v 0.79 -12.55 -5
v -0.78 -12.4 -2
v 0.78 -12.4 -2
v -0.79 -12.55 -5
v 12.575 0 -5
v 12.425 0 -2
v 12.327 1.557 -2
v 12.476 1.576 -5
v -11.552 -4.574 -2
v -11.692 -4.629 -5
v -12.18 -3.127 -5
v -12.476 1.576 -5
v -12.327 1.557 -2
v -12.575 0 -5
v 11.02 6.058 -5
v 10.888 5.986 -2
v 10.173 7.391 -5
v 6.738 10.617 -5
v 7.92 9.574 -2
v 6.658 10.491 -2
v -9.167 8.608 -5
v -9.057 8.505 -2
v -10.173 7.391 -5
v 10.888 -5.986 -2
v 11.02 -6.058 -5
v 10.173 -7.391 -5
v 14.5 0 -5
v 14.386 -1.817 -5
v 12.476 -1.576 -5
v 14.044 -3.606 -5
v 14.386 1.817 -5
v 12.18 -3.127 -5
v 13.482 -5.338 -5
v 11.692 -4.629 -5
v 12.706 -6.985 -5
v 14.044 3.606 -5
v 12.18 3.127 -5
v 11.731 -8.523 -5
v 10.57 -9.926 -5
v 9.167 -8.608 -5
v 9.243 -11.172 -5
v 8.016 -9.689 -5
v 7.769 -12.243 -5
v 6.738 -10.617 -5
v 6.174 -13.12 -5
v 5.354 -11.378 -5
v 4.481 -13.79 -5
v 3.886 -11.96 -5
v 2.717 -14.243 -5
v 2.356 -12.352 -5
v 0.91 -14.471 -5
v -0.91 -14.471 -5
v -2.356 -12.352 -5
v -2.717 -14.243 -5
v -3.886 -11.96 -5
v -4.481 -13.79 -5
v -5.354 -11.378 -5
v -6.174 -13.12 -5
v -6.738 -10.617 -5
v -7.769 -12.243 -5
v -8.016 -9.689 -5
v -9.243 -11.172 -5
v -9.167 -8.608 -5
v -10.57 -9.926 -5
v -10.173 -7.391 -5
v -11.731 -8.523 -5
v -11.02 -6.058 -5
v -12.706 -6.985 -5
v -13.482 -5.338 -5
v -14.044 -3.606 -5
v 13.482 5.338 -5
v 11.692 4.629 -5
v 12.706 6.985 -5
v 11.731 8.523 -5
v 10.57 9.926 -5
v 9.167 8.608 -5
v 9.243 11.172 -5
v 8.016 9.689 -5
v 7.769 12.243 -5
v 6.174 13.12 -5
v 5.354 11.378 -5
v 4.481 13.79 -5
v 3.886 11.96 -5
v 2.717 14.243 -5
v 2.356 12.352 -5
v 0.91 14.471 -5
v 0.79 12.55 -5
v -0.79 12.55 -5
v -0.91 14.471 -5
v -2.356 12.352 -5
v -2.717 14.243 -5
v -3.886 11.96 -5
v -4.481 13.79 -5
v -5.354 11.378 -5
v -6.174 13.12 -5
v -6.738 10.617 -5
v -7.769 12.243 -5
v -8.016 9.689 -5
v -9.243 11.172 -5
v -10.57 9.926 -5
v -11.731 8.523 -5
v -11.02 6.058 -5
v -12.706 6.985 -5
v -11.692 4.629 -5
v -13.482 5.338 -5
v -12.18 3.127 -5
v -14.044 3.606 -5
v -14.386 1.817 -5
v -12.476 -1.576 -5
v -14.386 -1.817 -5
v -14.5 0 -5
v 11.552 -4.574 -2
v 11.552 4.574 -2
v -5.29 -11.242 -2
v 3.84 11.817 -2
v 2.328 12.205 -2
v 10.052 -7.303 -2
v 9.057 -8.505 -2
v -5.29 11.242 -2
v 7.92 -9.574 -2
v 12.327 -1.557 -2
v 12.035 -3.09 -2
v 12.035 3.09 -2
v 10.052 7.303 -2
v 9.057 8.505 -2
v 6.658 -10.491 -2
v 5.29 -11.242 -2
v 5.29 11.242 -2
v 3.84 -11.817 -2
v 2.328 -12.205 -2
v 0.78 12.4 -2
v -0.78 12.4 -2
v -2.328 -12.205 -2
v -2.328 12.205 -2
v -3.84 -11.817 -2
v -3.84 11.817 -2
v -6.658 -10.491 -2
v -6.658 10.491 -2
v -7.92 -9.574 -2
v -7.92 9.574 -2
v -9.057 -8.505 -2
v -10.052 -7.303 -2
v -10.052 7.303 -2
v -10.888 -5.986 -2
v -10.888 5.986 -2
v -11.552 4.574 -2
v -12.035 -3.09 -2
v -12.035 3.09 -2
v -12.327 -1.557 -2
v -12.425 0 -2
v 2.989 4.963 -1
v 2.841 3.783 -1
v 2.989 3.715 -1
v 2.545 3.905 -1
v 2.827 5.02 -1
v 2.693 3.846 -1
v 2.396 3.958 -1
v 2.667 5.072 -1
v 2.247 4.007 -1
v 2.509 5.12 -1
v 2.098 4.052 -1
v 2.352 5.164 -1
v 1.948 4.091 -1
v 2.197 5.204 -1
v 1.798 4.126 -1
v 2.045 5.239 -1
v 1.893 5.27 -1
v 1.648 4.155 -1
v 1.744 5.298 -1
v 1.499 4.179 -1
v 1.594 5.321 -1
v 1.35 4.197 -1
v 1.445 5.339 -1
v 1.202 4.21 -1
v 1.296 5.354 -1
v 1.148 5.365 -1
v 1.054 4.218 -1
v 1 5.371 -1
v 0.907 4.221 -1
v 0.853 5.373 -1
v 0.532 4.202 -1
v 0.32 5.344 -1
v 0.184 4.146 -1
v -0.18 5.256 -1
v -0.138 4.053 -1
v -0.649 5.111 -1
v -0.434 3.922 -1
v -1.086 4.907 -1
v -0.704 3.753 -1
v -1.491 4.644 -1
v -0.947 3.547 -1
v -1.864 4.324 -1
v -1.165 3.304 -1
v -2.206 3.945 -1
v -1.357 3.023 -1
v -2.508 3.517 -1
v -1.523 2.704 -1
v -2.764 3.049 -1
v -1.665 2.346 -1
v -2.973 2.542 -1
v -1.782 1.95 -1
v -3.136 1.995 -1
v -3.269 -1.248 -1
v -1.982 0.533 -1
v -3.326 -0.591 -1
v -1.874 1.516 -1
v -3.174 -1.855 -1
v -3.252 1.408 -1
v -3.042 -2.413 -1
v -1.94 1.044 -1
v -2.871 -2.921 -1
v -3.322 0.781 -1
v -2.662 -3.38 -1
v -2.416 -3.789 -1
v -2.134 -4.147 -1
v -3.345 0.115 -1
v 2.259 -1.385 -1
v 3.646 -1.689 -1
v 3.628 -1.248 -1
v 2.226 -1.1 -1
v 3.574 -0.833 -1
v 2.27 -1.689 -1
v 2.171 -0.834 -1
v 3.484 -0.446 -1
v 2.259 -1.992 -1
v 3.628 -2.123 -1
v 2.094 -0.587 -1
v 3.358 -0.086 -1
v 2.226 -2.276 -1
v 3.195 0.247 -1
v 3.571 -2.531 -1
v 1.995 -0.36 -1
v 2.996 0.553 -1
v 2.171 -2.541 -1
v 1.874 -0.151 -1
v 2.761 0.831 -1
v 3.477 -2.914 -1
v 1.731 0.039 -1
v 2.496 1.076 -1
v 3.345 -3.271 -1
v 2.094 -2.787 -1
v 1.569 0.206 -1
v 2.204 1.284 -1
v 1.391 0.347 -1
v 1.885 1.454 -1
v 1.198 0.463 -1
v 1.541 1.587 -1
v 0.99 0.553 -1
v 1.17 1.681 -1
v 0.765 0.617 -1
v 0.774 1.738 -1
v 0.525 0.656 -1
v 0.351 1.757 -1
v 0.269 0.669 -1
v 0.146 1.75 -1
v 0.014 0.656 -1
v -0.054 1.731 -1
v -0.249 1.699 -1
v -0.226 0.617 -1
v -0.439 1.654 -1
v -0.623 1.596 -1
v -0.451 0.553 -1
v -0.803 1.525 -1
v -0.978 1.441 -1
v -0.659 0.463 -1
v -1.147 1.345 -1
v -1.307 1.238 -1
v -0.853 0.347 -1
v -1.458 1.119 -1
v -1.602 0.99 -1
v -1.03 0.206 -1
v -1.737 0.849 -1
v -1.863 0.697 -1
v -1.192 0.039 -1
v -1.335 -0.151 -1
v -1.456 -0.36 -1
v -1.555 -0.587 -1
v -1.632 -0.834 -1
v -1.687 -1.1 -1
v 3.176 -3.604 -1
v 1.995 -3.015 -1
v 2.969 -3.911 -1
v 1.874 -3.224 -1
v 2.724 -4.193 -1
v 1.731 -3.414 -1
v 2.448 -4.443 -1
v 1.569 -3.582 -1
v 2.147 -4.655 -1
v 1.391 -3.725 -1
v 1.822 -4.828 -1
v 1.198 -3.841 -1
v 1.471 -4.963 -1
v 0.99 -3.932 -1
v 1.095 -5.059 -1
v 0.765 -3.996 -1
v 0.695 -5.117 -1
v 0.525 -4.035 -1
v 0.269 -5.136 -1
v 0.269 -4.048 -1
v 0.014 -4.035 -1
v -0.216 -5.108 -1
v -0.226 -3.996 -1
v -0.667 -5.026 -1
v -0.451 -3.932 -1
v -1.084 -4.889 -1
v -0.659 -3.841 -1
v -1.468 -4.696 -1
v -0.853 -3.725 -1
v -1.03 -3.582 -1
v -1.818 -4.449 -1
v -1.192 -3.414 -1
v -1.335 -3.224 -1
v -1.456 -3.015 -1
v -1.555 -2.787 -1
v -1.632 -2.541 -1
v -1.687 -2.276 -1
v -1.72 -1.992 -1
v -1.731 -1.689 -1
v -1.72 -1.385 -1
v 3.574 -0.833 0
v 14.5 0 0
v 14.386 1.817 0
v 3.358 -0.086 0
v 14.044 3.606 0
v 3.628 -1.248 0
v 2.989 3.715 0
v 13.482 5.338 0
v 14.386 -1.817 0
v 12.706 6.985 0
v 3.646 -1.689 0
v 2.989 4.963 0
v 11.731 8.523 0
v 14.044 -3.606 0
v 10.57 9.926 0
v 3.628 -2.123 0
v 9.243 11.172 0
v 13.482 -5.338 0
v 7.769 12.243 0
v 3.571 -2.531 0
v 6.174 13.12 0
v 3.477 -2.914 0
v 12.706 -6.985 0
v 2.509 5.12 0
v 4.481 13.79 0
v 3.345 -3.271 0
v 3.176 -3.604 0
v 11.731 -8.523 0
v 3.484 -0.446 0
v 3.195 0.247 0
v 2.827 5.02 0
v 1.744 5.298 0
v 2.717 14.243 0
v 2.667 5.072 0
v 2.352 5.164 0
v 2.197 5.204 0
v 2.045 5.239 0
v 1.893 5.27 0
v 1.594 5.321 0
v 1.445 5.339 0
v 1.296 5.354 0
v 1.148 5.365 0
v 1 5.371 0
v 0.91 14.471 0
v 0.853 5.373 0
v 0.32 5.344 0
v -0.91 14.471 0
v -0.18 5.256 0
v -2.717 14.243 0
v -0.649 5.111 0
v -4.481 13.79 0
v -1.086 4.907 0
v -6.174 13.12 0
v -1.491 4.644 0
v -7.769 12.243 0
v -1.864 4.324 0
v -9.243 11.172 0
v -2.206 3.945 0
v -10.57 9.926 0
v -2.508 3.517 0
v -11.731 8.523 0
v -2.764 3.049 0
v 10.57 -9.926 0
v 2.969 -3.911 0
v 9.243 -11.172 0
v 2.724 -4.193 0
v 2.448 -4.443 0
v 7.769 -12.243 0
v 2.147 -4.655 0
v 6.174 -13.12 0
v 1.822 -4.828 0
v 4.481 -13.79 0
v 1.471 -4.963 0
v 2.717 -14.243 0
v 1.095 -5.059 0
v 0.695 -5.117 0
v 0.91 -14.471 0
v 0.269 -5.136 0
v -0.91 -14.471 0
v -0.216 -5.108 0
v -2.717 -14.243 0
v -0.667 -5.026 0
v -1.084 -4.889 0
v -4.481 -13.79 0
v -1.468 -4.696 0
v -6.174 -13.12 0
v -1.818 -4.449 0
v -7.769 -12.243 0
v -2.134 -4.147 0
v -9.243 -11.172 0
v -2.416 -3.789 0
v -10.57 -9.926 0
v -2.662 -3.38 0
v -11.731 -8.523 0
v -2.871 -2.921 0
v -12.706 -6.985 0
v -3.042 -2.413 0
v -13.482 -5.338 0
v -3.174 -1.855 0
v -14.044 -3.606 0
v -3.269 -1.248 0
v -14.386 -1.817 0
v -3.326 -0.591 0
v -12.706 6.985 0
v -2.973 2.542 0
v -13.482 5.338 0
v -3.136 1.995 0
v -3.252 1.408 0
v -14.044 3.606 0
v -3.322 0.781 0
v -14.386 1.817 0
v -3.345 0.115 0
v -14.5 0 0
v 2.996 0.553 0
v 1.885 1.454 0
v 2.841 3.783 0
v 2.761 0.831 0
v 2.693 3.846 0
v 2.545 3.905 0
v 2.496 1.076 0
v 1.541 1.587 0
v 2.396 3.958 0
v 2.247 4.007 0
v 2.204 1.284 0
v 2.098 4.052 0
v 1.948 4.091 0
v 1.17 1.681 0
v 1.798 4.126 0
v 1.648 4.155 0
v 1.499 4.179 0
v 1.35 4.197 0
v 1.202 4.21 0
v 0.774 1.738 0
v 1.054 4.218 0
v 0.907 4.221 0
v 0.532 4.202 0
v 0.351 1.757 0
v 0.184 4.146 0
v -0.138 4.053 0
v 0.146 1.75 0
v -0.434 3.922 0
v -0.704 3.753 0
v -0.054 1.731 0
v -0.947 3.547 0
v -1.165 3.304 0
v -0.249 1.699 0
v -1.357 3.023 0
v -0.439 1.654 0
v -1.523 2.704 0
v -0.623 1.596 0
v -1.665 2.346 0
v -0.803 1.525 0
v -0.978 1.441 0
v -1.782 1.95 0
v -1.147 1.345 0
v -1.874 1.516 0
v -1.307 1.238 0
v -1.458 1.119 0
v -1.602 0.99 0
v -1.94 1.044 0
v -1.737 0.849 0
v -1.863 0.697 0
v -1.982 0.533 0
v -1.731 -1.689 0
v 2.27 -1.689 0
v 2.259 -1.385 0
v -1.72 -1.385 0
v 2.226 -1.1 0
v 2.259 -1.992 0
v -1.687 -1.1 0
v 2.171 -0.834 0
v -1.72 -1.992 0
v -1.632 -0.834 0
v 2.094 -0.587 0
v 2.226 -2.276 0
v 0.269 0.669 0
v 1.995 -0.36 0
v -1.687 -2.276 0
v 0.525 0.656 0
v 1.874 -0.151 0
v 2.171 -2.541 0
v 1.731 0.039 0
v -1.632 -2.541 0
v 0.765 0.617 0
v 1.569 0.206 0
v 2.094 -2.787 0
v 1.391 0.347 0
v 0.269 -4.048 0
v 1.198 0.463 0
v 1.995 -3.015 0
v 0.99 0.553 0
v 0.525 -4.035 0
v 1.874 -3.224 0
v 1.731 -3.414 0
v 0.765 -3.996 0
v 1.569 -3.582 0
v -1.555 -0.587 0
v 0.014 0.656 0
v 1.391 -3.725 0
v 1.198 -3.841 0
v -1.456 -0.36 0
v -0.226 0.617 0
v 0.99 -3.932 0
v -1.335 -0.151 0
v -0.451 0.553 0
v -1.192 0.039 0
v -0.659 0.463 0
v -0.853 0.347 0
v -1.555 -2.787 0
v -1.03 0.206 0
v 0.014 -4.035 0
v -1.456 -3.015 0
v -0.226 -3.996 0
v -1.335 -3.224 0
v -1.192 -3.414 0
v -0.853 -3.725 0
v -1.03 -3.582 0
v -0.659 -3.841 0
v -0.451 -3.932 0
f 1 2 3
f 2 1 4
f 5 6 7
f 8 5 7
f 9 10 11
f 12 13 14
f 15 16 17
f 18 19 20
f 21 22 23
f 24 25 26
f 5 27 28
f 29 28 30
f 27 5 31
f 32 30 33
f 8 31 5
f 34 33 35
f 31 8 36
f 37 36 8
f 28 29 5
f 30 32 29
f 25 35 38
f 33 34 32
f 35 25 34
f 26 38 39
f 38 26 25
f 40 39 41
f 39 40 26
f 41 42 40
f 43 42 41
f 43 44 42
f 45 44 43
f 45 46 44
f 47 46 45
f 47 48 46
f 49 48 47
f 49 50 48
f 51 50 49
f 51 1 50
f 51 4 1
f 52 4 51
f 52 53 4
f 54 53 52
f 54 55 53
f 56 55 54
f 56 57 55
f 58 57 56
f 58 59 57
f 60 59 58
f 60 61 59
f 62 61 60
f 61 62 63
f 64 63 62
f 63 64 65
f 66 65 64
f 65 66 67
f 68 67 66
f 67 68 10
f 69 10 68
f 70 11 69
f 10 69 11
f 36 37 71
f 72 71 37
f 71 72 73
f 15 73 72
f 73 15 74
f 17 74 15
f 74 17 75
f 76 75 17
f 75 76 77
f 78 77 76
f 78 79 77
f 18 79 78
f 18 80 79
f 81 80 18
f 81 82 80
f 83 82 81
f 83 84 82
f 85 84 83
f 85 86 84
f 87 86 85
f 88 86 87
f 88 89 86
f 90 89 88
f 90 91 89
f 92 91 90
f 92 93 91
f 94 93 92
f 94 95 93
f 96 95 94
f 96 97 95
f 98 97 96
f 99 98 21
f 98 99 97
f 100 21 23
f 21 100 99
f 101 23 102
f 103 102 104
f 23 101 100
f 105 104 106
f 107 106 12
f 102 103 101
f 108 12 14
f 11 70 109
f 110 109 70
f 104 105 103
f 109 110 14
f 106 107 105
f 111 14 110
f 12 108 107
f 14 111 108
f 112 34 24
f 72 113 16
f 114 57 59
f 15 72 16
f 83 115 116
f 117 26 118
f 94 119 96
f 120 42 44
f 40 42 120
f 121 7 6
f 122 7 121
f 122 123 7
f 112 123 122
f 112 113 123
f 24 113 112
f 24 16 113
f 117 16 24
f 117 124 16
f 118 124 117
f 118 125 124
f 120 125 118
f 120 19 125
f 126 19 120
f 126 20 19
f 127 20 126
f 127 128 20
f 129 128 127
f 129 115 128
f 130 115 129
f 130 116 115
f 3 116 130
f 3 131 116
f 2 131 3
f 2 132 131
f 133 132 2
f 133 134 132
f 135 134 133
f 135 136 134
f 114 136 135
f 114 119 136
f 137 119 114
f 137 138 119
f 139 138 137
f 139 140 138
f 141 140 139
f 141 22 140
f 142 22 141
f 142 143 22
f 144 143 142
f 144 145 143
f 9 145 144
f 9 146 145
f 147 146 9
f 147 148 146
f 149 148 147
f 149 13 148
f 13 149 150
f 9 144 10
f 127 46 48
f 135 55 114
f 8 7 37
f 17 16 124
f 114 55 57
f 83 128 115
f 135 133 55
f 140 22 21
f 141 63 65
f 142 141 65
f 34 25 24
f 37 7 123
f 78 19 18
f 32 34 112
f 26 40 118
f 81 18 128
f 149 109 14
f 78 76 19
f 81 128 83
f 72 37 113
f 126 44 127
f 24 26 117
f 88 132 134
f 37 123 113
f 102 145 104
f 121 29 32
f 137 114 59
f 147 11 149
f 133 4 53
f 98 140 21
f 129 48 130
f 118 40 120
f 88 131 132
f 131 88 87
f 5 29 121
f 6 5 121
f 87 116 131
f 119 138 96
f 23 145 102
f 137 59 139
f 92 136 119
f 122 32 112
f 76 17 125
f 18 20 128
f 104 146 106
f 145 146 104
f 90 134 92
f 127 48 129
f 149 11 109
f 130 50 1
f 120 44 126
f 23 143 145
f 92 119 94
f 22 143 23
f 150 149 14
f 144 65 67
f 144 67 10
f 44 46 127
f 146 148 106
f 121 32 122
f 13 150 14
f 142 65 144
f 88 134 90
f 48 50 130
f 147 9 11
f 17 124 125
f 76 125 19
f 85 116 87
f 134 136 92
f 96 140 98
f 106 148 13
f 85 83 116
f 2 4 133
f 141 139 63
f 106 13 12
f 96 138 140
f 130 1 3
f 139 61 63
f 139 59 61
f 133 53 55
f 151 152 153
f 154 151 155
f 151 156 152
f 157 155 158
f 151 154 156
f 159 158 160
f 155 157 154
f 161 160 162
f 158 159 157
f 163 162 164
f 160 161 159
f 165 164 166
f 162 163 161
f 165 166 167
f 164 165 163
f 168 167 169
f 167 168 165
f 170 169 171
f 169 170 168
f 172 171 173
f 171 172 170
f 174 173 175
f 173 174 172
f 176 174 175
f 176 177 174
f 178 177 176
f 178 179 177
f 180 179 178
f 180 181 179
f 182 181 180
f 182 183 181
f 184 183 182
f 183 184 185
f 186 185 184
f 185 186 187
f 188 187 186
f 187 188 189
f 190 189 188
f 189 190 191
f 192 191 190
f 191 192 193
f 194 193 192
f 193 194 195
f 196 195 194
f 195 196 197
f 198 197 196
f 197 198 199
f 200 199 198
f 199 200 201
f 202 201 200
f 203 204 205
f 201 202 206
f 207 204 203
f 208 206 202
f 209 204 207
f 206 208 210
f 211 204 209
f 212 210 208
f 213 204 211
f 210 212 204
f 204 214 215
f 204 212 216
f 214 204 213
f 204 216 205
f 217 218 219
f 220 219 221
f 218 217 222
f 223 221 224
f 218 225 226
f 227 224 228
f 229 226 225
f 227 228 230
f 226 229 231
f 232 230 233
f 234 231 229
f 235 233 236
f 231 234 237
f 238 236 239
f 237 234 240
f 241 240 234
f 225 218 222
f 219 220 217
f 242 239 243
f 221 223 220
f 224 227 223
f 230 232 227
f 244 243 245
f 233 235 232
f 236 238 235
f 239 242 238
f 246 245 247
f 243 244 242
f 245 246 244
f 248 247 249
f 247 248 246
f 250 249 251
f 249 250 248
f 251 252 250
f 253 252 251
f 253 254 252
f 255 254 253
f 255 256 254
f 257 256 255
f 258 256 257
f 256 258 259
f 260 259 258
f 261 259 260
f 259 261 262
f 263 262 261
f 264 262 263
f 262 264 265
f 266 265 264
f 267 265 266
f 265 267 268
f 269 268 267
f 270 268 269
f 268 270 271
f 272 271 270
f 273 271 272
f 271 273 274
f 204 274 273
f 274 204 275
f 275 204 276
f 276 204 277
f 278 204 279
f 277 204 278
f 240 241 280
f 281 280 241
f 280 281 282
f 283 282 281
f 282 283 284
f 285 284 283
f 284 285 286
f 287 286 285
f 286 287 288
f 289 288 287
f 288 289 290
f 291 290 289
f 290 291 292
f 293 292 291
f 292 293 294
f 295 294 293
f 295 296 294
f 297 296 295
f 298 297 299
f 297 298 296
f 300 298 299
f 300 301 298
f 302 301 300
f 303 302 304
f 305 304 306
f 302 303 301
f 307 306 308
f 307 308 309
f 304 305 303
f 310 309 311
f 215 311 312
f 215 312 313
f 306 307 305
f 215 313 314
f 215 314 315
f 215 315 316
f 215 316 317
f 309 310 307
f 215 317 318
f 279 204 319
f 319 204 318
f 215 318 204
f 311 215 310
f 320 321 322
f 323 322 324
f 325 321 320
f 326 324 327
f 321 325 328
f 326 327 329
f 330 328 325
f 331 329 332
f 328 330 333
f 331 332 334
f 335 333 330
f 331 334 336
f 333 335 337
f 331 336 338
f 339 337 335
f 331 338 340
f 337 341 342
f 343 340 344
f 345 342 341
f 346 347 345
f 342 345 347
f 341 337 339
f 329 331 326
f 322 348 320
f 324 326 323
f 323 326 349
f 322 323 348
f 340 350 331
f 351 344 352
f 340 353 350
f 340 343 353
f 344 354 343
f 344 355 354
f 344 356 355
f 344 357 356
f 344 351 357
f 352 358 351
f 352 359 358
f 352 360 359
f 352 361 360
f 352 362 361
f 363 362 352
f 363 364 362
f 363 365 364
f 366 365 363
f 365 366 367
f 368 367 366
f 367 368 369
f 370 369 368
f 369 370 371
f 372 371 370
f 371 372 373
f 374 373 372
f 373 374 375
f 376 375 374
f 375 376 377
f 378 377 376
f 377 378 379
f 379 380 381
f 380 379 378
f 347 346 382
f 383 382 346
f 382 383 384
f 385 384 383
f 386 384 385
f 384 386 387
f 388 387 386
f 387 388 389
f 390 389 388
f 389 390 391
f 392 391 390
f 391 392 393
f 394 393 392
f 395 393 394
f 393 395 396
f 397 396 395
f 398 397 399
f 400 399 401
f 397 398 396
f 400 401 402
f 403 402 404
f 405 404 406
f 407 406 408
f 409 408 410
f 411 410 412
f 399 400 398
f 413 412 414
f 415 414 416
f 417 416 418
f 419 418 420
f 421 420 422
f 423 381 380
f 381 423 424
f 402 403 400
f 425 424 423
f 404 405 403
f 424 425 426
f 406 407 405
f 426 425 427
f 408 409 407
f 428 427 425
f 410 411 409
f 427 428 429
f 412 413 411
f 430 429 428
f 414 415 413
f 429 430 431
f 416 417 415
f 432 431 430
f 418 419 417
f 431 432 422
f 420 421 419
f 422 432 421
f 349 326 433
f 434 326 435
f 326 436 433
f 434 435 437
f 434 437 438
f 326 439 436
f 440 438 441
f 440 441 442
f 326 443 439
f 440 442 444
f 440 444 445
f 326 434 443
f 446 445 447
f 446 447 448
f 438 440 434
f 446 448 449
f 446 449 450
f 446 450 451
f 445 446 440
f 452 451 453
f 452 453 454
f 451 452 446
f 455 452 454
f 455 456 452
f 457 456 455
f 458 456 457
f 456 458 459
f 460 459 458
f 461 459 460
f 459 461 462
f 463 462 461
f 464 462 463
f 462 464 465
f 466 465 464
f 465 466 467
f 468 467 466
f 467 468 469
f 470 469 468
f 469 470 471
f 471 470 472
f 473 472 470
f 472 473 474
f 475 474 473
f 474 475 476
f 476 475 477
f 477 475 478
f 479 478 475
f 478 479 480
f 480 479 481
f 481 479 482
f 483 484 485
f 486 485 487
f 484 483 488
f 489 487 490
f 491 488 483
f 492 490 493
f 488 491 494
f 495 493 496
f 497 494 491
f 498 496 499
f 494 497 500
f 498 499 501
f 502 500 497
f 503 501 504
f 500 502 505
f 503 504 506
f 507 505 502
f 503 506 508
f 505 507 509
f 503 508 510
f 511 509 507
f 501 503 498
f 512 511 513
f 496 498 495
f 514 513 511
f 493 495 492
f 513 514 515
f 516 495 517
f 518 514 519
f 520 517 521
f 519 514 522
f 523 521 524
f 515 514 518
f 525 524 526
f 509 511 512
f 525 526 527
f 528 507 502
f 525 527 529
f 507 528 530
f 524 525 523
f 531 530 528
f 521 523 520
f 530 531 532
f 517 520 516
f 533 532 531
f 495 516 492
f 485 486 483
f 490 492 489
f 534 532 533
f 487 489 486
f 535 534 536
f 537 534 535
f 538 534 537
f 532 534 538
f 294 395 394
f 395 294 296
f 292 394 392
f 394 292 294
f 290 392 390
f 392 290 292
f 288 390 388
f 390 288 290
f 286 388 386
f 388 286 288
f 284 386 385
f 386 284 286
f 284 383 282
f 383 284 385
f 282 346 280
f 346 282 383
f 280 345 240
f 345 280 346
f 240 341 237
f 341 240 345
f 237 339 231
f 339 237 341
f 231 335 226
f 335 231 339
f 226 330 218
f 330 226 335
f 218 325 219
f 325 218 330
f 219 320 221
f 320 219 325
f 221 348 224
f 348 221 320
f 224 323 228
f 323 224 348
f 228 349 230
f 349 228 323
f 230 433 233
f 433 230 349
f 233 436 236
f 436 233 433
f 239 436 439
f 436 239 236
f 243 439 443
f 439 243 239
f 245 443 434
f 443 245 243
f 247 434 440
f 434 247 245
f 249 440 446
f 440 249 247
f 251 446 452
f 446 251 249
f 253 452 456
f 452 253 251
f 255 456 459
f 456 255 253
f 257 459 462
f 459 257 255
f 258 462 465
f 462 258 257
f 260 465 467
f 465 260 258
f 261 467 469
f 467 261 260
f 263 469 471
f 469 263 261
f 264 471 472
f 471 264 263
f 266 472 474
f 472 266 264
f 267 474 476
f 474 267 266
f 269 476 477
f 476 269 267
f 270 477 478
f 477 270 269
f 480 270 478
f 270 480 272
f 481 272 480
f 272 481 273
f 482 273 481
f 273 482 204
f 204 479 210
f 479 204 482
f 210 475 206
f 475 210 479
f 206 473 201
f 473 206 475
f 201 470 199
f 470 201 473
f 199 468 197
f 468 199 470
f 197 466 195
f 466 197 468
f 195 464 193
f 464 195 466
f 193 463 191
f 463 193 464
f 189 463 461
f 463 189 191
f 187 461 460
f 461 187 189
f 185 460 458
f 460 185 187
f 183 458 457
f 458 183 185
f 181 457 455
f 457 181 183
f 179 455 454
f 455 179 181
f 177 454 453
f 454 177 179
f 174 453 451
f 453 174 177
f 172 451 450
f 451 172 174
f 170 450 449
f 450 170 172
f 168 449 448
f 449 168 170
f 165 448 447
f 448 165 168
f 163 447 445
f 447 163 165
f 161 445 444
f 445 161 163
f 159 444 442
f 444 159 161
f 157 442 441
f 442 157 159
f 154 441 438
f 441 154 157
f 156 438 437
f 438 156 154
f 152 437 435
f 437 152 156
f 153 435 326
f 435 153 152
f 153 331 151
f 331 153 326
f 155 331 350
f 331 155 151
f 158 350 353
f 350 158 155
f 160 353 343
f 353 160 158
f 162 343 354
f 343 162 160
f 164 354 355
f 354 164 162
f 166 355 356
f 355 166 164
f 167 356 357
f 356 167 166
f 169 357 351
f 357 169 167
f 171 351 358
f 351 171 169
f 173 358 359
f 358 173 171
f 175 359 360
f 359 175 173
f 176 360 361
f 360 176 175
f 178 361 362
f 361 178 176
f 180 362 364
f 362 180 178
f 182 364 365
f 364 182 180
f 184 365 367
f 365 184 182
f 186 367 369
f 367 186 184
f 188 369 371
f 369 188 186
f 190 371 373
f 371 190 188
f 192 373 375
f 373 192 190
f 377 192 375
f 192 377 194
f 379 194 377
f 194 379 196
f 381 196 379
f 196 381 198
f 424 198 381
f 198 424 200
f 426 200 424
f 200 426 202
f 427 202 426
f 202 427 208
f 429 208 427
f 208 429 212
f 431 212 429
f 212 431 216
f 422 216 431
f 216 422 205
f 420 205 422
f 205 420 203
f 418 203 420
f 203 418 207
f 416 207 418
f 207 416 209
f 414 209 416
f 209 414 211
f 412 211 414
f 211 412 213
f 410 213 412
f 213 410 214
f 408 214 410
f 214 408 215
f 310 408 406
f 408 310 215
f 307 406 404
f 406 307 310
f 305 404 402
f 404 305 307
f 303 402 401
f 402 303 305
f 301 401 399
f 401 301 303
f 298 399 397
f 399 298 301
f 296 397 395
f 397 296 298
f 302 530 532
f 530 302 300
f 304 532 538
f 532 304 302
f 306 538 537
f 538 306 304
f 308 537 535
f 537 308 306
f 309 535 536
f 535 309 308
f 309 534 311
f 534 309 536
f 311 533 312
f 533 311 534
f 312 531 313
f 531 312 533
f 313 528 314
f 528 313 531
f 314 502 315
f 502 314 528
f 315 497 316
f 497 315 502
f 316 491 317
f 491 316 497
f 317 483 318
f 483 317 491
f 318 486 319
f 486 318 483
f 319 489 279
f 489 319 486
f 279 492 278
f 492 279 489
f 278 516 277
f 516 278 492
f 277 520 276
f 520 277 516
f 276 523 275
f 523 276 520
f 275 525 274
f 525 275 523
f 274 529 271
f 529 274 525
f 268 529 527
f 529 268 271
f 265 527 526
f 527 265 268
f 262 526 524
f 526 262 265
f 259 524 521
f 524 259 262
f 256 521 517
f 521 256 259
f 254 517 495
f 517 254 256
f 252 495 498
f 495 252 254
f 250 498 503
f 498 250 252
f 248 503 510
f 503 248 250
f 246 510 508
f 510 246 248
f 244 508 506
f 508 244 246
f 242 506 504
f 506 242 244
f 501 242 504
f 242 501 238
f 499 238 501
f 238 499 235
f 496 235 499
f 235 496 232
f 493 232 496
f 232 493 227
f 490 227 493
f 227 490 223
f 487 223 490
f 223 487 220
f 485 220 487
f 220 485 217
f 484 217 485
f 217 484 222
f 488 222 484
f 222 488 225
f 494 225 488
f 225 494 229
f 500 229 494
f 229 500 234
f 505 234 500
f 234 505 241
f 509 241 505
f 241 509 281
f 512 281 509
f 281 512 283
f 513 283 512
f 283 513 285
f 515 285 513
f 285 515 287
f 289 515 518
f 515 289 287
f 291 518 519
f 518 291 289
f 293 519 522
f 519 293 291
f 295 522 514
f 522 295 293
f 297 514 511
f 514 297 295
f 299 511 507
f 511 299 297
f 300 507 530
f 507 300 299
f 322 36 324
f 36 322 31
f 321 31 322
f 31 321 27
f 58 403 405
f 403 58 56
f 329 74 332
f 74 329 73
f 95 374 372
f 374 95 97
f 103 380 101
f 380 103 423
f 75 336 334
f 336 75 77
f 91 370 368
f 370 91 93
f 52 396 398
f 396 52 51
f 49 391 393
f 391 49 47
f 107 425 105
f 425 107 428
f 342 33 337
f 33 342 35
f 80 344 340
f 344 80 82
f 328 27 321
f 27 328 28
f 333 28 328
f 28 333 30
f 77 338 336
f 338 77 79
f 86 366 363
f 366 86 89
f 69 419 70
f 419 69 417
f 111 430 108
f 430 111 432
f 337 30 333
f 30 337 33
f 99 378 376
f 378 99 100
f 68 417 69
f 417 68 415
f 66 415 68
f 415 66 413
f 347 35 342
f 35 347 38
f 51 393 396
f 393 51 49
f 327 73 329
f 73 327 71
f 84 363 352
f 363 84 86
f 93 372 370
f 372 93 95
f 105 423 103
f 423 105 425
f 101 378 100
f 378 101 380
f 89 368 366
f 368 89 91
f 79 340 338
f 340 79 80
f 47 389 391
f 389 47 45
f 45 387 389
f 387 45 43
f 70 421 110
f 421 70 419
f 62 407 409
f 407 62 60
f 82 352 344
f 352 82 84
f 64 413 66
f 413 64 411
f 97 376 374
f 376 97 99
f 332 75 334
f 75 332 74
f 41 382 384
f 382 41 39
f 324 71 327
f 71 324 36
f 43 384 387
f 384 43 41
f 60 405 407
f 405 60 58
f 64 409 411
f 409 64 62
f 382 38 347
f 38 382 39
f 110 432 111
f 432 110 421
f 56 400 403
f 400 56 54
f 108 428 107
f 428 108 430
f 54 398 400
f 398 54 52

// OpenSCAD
$fn = 50;

difference() {
	union() {
		translate(v = [0, 0, -5.0]) {
			cylinder(h = 5, r = 14.5);
		}
	}
	union() {
		#translate(v = [0, 0, -5.0]) {
			cylinder(h = 3, r1 = 12.575, r2 = 12.425);
		}
		translate(v = [0, 0, -1]) {
			linear_extrude(height = 1) {
				text(font = "Impact", halign = "center", size = 10, text = "6", valign = "center");
			}
		}
	}
}
